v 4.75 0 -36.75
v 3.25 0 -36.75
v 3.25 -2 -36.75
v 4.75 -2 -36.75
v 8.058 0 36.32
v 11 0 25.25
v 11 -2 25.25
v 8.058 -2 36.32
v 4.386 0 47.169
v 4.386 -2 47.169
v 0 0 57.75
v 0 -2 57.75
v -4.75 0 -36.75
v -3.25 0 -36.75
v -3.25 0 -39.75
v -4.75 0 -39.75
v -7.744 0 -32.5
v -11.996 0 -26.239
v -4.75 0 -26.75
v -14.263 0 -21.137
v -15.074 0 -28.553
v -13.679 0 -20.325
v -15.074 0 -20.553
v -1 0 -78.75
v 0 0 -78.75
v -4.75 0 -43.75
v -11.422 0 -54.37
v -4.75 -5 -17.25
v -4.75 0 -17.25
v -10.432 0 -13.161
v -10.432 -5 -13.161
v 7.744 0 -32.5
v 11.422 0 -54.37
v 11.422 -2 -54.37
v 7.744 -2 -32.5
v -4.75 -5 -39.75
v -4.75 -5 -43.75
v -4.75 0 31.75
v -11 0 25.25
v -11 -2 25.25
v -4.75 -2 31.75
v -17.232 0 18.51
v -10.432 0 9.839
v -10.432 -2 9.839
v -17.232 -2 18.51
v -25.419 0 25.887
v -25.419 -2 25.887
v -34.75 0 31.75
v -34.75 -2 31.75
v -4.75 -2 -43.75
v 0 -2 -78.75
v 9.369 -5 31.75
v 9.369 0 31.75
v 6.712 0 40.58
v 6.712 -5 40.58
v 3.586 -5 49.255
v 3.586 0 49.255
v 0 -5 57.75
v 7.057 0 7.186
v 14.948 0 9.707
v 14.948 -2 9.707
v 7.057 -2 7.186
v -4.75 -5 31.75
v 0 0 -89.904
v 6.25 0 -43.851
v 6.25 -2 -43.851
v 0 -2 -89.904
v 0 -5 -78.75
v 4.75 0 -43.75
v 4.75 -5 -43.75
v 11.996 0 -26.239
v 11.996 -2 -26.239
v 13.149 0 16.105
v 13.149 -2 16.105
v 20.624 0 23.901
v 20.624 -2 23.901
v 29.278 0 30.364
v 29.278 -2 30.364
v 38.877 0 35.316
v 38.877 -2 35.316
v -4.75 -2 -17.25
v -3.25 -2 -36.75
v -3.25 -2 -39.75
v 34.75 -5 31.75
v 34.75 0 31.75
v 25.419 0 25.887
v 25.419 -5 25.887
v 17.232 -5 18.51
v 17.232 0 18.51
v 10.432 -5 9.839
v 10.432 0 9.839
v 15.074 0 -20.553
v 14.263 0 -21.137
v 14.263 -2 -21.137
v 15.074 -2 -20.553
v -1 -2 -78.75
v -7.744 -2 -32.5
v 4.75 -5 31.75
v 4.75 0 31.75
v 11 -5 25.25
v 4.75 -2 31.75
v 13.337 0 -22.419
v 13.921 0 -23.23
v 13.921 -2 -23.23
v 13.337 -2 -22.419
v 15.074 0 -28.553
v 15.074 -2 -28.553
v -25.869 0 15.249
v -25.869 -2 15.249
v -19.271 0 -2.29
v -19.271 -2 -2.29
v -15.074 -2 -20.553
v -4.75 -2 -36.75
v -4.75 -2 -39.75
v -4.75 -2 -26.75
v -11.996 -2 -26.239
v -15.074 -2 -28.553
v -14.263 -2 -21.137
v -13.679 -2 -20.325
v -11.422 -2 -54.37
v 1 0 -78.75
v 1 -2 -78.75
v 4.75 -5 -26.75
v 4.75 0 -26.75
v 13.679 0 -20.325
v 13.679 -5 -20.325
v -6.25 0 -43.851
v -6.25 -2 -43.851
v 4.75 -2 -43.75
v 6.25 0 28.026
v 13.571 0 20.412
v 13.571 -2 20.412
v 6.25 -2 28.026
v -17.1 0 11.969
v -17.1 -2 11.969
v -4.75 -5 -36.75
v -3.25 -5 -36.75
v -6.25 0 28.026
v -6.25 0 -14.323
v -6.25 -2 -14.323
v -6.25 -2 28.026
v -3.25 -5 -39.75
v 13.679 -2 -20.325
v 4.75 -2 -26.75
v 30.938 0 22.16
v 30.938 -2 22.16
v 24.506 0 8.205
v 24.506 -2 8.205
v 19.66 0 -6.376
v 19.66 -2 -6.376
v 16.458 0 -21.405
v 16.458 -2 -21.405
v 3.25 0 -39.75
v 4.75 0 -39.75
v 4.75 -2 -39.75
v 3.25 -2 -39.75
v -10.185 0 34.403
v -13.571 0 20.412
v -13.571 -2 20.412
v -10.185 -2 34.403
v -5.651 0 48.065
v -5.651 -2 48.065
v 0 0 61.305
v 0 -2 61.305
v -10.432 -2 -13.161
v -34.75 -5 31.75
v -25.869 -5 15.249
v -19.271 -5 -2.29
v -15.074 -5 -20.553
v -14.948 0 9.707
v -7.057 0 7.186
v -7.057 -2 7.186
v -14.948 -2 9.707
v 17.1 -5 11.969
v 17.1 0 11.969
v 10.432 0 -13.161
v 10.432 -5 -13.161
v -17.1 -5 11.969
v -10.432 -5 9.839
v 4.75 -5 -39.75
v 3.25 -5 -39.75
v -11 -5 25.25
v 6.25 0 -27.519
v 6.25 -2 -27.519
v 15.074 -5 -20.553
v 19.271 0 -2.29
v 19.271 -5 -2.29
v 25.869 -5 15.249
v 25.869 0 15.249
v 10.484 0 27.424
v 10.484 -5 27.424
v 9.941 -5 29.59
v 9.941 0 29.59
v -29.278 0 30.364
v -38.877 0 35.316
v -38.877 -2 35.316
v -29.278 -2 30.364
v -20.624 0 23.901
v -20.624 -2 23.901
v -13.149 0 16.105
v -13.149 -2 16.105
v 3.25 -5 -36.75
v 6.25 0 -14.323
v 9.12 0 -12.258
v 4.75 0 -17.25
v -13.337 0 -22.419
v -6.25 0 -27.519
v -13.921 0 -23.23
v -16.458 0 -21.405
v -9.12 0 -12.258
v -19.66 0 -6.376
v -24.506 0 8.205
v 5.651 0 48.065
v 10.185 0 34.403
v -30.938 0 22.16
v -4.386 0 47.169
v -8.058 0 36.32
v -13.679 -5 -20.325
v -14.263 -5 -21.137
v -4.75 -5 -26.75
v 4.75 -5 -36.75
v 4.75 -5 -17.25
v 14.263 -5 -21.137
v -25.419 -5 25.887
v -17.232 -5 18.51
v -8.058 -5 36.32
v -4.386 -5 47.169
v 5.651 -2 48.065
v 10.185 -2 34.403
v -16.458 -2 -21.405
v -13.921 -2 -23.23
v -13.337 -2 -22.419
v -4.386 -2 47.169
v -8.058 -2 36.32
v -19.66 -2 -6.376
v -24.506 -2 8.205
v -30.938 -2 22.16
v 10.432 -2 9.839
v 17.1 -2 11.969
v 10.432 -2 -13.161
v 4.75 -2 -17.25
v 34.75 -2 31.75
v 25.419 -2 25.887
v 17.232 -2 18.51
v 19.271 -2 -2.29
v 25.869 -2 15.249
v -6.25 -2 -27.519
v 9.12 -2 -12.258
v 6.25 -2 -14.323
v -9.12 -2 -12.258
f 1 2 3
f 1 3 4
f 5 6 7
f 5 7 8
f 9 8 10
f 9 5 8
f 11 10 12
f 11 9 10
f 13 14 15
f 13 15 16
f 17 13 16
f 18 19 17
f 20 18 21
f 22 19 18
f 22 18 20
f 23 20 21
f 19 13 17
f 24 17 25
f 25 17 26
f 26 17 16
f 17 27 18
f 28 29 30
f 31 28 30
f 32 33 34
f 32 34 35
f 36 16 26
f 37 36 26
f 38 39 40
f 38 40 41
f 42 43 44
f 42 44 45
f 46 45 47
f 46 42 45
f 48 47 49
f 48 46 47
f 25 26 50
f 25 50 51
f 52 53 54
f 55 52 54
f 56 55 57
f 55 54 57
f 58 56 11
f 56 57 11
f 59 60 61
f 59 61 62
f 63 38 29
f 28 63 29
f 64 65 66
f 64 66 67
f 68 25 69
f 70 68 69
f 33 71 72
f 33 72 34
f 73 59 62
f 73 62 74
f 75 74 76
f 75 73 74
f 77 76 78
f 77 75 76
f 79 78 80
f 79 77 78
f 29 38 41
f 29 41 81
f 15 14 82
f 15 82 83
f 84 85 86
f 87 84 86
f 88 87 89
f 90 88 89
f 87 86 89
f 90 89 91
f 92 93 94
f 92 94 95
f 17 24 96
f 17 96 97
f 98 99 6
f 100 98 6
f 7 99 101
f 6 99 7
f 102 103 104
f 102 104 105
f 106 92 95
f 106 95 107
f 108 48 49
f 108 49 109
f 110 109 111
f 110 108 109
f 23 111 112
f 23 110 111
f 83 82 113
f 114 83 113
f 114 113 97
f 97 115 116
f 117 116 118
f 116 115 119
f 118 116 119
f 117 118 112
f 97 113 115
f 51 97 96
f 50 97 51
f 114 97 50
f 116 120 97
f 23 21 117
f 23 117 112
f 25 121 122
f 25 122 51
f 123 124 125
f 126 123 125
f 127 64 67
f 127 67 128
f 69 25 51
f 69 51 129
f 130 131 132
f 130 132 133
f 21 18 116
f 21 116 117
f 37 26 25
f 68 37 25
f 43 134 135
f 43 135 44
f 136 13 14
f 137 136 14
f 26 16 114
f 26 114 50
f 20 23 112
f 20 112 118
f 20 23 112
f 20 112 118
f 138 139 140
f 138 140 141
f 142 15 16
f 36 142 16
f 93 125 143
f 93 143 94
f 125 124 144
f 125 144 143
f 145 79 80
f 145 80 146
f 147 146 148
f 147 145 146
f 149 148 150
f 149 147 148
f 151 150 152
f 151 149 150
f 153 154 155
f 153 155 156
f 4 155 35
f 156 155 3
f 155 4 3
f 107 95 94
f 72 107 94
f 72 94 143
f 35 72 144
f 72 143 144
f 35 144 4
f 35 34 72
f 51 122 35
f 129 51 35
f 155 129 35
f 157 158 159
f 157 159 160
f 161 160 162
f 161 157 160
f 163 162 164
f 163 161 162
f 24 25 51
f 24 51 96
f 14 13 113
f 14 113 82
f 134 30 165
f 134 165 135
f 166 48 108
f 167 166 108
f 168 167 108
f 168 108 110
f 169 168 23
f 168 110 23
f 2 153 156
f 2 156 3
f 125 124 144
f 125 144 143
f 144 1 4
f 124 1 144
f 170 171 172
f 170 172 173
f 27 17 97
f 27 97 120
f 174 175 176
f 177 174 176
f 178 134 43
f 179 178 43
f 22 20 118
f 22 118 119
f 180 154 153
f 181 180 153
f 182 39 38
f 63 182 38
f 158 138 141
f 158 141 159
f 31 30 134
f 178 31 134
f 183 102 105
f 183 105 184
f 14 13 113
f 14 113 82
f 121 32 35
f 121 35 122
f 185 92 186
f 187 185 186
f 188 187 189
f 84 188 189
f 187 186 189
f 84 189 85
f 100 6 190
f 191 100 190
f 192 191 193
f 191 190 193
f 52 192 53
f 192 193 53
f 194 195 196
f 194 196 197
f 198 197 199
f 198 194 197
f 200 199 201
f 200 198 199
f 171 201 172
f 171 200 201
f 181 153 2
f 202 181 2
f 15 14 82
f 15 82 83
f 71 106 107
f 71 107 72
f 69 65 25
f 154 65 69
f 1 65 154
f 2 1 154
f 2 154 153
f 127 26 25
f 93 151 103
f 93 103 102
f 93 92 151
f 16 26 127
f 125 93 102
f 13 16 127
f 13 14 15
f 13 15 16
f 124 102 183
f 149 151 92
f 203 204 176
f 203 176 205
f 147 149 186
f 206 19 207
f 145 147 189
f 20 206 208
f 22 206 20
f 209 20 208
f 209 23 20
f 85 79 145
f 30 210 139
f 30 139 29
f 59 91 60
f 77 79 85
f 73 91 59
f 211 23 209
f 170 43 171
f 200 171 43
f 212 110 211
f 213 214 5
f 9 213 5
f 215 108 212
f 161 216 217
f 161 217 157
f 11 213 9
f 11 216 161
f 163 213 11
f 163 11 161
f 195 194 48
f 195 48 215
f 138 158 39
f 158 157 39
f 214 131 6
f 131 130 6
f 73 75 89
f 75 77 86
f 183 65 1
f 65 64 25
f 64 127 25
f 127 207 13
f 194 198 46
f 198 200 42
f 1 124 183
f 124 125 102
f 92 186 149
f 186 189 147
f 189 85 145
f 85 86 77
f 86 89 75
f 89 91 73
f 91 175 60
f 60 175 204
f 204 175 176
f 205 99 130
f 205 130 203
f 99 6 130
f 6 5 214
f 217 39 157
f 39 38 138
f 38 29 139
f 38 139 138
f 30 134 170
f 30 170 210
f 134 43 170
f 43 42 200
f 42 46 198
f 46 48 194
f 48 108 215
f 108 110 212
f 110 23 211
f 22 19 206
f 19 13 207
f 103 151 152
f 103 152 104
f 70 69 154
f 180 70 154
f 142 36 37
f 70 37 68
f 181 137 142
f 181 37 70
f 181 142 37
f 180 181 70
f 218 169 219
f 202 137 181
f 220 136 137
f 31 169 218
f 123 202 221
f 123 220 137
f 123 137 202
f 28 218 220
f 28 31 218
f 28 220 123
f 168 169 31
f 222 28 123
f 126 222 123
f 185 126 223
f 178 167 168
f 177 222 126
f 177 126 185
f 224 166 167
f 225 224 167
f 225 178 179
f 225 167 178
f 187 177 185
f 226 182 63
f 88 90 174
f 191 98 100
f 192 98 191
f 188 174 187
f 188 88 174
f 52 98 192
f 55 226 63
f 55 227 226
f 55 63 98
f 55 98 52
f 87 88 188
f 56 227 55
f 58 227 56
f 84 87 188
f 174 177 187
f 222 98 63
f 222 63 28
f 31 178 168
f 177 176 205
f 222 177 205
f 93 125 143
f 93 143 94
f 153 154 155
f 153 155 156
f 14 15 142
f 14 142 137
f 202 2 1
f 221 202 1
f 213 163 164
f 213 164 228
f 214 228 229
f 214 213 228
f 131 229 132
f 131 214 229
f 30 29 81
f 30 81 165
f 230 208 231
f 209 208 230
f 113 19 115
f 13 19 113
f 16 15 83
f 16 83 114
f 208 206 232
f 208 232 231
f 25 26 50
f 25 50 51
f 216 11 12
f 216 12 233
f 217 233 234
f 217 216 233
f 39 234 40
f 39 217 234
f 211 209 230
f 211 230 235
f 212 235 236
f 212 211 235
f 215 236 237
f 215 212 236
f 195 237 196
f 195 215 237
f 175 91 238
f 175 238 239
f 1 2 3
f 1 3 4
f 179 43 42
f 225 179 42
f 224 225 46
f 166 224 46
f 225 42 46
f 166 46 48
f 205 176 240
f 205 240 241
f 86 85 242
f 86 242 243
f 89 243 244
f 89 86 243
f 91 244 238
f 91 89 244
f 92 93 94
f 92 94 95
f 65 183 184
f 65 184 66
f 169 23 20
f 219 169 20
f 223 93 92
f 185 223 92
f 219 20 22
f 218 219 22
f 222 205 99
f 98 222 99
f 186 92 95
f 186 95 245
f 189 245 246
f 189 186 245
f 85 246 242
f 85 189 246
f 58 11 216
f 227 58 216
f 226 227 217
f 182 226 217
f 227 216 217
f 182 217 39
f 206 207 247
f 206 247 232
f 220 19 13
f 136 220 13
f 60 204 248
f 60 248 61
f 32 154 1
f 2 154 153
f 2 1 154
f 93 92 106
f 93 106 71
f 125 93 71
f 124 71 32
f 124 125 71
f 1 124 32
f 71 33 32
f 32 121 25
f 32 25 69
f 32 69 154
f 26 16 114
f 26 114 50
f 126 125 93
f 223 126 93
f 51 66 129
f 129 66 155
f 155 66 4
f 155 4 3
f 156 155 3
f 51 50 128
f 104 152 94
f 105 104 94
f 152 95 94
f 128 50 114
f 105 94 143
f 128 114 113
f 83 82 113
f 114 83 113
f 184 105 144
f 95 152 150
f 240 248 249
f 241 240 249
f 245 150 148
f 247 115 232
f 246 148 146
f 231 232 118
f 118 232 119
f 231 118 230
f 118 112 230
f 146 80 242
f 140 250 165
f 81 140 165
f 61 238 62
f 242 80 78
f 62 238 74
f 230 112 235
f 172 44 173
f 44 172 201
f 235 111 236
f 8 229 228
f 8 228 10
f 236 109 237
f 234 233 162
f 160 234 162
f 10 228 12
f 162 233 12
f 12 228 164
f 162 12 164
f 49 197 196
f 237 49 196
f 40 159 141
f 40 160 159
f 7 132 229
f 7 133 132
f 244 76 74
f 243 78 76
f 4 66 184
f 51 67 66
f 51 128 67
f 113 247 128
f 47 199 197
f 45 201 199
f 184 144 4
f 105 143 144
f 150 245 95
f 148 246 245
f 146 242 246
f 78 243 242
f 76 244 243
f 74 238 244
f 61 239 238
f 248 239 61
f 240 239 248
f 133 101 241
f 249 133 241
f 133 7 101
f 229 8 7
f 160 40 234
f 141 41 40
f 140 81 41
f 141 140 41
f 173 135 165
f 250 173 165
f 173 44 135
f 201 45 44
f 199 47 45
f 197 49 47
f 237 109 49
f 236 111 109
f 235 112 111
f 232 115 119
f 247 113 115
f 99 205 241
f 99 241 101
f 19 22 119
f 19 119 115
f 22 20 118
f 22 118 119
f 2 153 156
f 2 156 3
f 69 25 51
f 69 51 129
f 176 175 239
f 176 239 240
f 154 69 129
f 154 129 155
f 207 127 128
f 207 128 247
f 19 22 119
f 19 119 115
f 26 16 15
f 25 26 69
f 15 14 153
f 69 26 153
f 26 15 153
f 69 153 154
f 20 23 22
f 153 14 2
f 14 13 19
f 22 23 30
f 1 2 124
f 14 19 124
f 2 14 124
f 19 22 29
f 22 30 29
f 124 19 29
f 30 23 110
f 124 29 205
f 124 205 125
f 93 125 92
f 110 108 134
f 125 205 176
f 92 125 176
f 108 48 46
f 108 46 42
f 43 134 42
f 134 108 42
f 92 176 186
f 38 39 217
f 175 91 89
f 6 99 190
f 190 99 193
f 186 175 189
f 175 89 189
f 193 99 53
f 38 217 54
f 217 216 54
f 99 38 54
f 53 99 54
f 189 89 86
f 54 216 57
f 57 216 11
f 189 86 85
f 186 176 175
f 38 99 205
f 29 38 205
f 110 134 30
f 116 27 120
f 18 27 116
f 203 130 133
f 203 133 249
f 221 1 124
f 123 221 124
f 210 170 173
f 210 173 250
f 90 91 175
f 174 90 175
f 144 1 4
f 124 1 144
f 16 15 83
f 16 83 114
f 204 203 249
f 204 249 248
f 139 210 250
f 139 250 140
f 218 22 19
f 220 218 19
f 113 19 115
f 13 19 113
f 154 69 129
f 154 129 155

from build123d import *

# Parameters (mm, degrees)
F0_W     = 9.5
F0_H     = 3
F0_W_2   = 4.75
F0_H_2   = 6.5
F0_W_3   = 6.5
F1_DEPTH = 5
F3_DEPTH = 2
F5_DEPTH = 2


with BuildPart() as f1:
    # F0 (on Front) → F1 (new body)
    with BuildSketch(Plane.XZ):
        Polygon((4.75, -32.75), (4.75, -31.75), (0, -31.75), (-4.75, -31.75), (-4.75, -32.75), align=None)
        Polygon((0, -31.75), (4.75, -31.75), (4.75, -26.75), (4.75, -17.25), (4.75, 25.25), (0, 25.25), (-4.75, 25.25), (-4.75, -17.25), (-4.75, -26.75), (-4.75, -31.75), align=None)
        with BuildLine():
            Line((4.75, -17.25), (4.75, -26.75))
            Line((4.75, -26.75), (13.6785707143, -20.325))
            Line((13.6785707143, -20.325), (14.2626616234, -21.1366882468))
            Line((14.2626616234, -21.1366882468), (15.0743498701, -20.5525973377))
            ThreePointArc((15.0743498701, -20.5525973377), (22.2760836347, 6.5903692937), (34.75, 31.75))
            ThreePointArc((34.75, 31.75), (21.1663739273, 22.3753288761), (10.4318177273, 9.8386363636))
            Line((10.4318177273, 9.8386363636), (17.0997445143, 11.9690711462))
            Line((17.0997445143, 11.9690711462), (10.4318177273, -13.1613636364))
            Line((10.4318177273, -13.1613636364), (4.75, -17.25))
        make_face()
        with Locations((0, -34.25)):
            Rectangle(F0_W, F0_H)
        Polygon((4.75, -36.75), (4.75, -35.75), (-4.75, -35.75), (-4.75, -36.75), (-3.25, -36.75), (3.25, -36.75), align=None)
        with BuildLine():
            Line((-13.6785707143, -20.325), (-4.75, -26.75))
            Line((-4.75, -26.75), (-4.75, -17.25))
            Line((-4.75, -17.25), (-10.4318177273, -13.1613636364))
            Line((-10.4318177273, -13.1613636364), (-17.0997445143, 11.9690711462))
            Line((-17.0997445143, 11.9690711462), (-10.4318177273, 9.8386363636))
            ThreePointArc((-10.4318177273, 9.8386363636), (-21.1663739273, 22.3753288761), (-34.75, 31.75))
            ThreePointArc((-34.75, 31.75), (-22.2760836347, 6.5903692937), (-15.0743498701, -20.5525973377))
            Line((-15.0743498701, -20.5525973377), (-14.2626616234, -21.1366882468))
            Line((-14.2626616234, -21.1366882468), (-13.6785707143, -20.325))
        make_face()
        with Locations((2.375, 28.5)):
            Rectangle(F0_W_2, F0_H_2)
        Polygon((8.8, 31.75), (4.75, 31.75), (11, 25.25), align=None)
        Polygon((0, 31.75), (4.75, 31.75), (8.8, 31.75), (0, 57.75), align=None)
        with Locations((-2.375, 28.5)):
            Rectangle(F0_W_2, F0_H_2)
        with BuildLine():
            Line((8.8, 31.75), (11, 25.25))
            ThreePointArc((11, 25.25), (10.2159514871, 28.5079487405), (9.3685639152, 31.75))
            Line((9.3685639152, 31.75), (8.8, 31.75))
        make_face()
        with Locations((0, -38.25)):
            Rectangle(F0_W_3, F0_H)
        Polygon((-4.75, 31.75), (0, 31.75), (0, 57.75), (-11, 25.25), align=None)
        with BuildLine():
            Line((0, 57.75), (8.8, 31.75))
            Line((8.8, 31.75), (9.3685639152, 31.75))
            ThreePointArc((9.3685639152, 31.75), (5.207479083, 44.9385232965), (0, 57.75))
        make_face()
        Polygon((4.75, -39.75), (3.25, -39.75), (-3.25, -39.75), (-4.75, -39.75), (-4.75, -40.75), (4.75, -40.75), align=None)
        with BuildLine():
            ThreePointArc((0, 57.75), (-6.3126627605, 41.7750550882), (-11, 25.25))
            Line((-11, 25.25), (0, 57.75))
        make_face()
        Polygon((4.75, -43.75), (4.75, -40.75), (-4.75, -40.75), (-4.75, -43.75), (0, -43.75), align=None)
        Polygon((0, -78.75), (4.75, -43.75), (0, -43.75), align=None)
        Polygon((0, -43.75), (-4.75, -43.75), (0, -78.75), align=None)
    extrude(amount=F1_DEPTH)


with BuildPart() as f3:
    # F2 (on face) → F3 (new body)
    with BuildSketch(Plane(origin=(0, 0, 0), x_dir=(-1, 0, 0), z_dir=(0, 1, 0))):
        Polygon((15.0743498701, -28.5525973377), (15.0743498701, -20.5525973377), (14.2626616234, -21.1366882468), (13.6785707143, -20.325), (4.75, -26.75), (4.75, -36.75), (3.25, -36.75), (3.25, -39.75), (4.75, -39.75), (4.75, -43.75), (0, -78.75), (1, -78.75), (7.7438349836, -32.4999243021), (11.4220166579, -54.3695688248), (11.9964974001, -26.2390598655), align=None)
    extrude(amount=-F3_DEPTH)


with BuildPart() as f3b:
    # F2 (on face) → F3, piece 2 (new body)
    with BuildSketch(Plane(origin=(0, 0, 0), x_dir=(-1, 0, 0), z_dir=(0, 1, 0))):
        Polygon((-1, -78.75), (0, -78.75), (-4.75, -43.75), (-4.75, -39.75), (-3.25, -39.75), (-3.25, -36.75), (-4.75, -36.75), (-4.75, -26.75), (-13.6785707143, -20.325), (-14.2626616234, -21.1366882468), (-15.0743498701, -20.5525973377), (-15.0743498701, -28.5525973377), (-11.9964974001, -26.2390598655), (-11.4220166579, -54.3695688248), (-7.7438349836, -32.4999243021), align=None)
    extrude(amount=-F3_DEPTH)


with BuildPart() as f5:
    # F4 (on face) → F5 (new body)
    with BuildSketch(Plane(origin=(0, 0, 0), x_dir=(-1, 0, 0), z_dir=(0, 1, 0))):
        with BuildLine():
            Line((9.1197276527, -12.2575435817), (6.25, -14.3225997658))
            Line((6.25, -14.3225997658), (6.25, 28.0258373444))
            Line((6.25, 28.0258373444), (13.5709714754, 20.4120270099))
            ThreePointArc((13.5709714754, 20.4120270099), (8.0601511253, 41.2813035717), (0, 61.3045353033))
            ThreePointArc((0, 61.3045353033), (-8.0601511253, 41.2813035717), (-13.5709714754, 20.4120270099))
            Line((-13.5709714754, 20.4120270099), (-6.25, 28.0258373444))
            Line((-6.25, 28.0258373444), (-6.25, -14.3225997658))
            Line((-6.25, -14.3225997658), (-9.1197276527, -12.2575435817))
            Line((-9.1197276527, -12.2575435817), (-14.9475706012, 9.7067388435))
            Line((-14.9475706012, 9.7067388435), (-7.0573343808, 7.185770299))
            ThreePointArc((-7.0573343808, 7.185770299), (-20.623685191, 23.9014967836), (-38.8766030738, 35.3160653244))
            ThreePointArc((-38.8766030738, 35.3160653244), (-24.5064831966, 8.2050547659), (-16.4583681212, -21.4046578724))
            Line((-16.4583681212, -21.4046578724), (-13.9212656169, -23.2303569805))
            Line((-13.9212656169, -23.2303569805), (-13.3371747078, -22.4186687338))
            Line((-13.3371747078, -22.4186687338), (-6.25, -27.5186000615))
            Line((-6.25, -27.5186000615), (-6.25, -38.25))
            Line((-6.25, -38.25), (-6.25, -43.8513212997))
            Line((-6.25, -43.8513212997), (0, -89.9039528787))
            Line((0, -89.9039528787), (6.25, -43.8513212997))
            Line((6.25, -43.8513212997), (6.25, -38.25))
            Line((6.25, -38.25), (6.25, -27.5186000615))
            Line((6.25, -27.5186000615), (13.3371747078, -22.4186687338))
            Line((13.3371747078, -22.4186687338), (13.9212656169, -23.2303569805))
            Line((13.9212656169, -23.2303569805), (16.4583681212, -21.4046578724))
            ThreePointArc((16.4583681212, -21.4046578724), (24.5064831966, 8.2050547659), (38.8766030738, 35.3160653244))
            ThreePointArc((38.8766030738, 35.3160653244), (20.623685191, 23.9014967836), (7.0573343808, 7.185770299))
            Line((7.0573343808, 7.185770299), (14.9475706012, 9.7067388435))
            Line((14.9475706012, 9.7067388435), (9.1197276527, -12.2575435817))
        make_face()
        with BuildLine():
            Line((-4.75, -26.75), (-13.6785707143, -20.325))
            Line((-13.6785707143, -20.325), (-14.2626616234, -21.1366882468))
            Line((-14.2626616234, -21.1366882468), (-15.0743498701, -20.5525973377))
            ThreePointArc((-15.0743498701, -20.5525973377), (-22.2760836347, 6.5903692937), (-34.75, 31.75))
            ThreePointArc((-34.75, 31.75), (-21.1663739273, 22.3753288761), (-10.4318177273, 9.8386363636))
            Line((-10.4318177273, 9.8386363636), (-17.0997445143, 11.9690711462))
            Line((-17.0997445143, 11.9690711462), (-10.4318177273, -13.1613636364))
            Line((-10.4318177273, -13.1613636364), (-4.75, -17.25))
            Line((-4.75, -17.25), (-4.75, 31.75))
            Line((-4.75, 31.75), (-11, 25.25))
            ThreePointArc((-11, 25.25), (-6.3126627605, 41.7750550882), (0, 57.75))
            ThreePointArc((0, 57.75), (6.3126627605, 41.7750550882), (11, 25.25))
            Line((11, 25.25), (4.75, 31.75))
            Line((4.75, 31.75), (4.75, -17.25))
            Line((4.75, -17.25), (10.4318177273, -13.1613636364))
            Line((10.4318177273, -13.1613636364), (17.0997445143, 11.9690711462))
            Line((17.0997445143, 11.9690711462), (10.4318177273, 9.8386363636))
            ThreePointArc((10.4318177273, 9.8386363636), (21.1663739273, 22.3753288761), (34.75, 31.75))
            ThreePointArc((34.75, 31.75), (22.2760836347, 6.5903692937), (15.0743498701, -20.5525973377))
            Line((15.0743498701, -20.5525973377), (14.2626616234, -21.1366882468))
            Line((14.2626616234, -21.1366882468), (13.6785707143, -20.325))
            Line((13.6785707143, -20.325), (4.75, -26.75))
            Line((4.75, -26.75), (4.75, -36.75))
            Line((4.75, -36.75), (3.25, -36.75))
            Line((3.25, -36.75), (3.25, -39.75))
            Line((3.25, -39.75), (4.75, -39.75))
            Line((4.75, -39.75), (4.75, -43.75))
            Line((4.75, -43.75), (0, -78.75))
            Line((0, -78.75), (-4.75, -43.75))
            Line((-4.75, -43.75), (-4.75, -39.75))
            Line((-4.75, -39.75), (-3.25, -39.75))
            Line((-3.25, -39.75), (-3.25, -36.75))
            Line((-3.25, -36.75), (-4.75, -36.75))
            Line((-4.75, -36.75), (-4.75, -26.75))
        make_face(mode=Mode.SUBTRACT)
    extrude(amount=-F5_DEPTH)


solid = Compound([f1.part, f3.part, f3b.part, f5.part])
